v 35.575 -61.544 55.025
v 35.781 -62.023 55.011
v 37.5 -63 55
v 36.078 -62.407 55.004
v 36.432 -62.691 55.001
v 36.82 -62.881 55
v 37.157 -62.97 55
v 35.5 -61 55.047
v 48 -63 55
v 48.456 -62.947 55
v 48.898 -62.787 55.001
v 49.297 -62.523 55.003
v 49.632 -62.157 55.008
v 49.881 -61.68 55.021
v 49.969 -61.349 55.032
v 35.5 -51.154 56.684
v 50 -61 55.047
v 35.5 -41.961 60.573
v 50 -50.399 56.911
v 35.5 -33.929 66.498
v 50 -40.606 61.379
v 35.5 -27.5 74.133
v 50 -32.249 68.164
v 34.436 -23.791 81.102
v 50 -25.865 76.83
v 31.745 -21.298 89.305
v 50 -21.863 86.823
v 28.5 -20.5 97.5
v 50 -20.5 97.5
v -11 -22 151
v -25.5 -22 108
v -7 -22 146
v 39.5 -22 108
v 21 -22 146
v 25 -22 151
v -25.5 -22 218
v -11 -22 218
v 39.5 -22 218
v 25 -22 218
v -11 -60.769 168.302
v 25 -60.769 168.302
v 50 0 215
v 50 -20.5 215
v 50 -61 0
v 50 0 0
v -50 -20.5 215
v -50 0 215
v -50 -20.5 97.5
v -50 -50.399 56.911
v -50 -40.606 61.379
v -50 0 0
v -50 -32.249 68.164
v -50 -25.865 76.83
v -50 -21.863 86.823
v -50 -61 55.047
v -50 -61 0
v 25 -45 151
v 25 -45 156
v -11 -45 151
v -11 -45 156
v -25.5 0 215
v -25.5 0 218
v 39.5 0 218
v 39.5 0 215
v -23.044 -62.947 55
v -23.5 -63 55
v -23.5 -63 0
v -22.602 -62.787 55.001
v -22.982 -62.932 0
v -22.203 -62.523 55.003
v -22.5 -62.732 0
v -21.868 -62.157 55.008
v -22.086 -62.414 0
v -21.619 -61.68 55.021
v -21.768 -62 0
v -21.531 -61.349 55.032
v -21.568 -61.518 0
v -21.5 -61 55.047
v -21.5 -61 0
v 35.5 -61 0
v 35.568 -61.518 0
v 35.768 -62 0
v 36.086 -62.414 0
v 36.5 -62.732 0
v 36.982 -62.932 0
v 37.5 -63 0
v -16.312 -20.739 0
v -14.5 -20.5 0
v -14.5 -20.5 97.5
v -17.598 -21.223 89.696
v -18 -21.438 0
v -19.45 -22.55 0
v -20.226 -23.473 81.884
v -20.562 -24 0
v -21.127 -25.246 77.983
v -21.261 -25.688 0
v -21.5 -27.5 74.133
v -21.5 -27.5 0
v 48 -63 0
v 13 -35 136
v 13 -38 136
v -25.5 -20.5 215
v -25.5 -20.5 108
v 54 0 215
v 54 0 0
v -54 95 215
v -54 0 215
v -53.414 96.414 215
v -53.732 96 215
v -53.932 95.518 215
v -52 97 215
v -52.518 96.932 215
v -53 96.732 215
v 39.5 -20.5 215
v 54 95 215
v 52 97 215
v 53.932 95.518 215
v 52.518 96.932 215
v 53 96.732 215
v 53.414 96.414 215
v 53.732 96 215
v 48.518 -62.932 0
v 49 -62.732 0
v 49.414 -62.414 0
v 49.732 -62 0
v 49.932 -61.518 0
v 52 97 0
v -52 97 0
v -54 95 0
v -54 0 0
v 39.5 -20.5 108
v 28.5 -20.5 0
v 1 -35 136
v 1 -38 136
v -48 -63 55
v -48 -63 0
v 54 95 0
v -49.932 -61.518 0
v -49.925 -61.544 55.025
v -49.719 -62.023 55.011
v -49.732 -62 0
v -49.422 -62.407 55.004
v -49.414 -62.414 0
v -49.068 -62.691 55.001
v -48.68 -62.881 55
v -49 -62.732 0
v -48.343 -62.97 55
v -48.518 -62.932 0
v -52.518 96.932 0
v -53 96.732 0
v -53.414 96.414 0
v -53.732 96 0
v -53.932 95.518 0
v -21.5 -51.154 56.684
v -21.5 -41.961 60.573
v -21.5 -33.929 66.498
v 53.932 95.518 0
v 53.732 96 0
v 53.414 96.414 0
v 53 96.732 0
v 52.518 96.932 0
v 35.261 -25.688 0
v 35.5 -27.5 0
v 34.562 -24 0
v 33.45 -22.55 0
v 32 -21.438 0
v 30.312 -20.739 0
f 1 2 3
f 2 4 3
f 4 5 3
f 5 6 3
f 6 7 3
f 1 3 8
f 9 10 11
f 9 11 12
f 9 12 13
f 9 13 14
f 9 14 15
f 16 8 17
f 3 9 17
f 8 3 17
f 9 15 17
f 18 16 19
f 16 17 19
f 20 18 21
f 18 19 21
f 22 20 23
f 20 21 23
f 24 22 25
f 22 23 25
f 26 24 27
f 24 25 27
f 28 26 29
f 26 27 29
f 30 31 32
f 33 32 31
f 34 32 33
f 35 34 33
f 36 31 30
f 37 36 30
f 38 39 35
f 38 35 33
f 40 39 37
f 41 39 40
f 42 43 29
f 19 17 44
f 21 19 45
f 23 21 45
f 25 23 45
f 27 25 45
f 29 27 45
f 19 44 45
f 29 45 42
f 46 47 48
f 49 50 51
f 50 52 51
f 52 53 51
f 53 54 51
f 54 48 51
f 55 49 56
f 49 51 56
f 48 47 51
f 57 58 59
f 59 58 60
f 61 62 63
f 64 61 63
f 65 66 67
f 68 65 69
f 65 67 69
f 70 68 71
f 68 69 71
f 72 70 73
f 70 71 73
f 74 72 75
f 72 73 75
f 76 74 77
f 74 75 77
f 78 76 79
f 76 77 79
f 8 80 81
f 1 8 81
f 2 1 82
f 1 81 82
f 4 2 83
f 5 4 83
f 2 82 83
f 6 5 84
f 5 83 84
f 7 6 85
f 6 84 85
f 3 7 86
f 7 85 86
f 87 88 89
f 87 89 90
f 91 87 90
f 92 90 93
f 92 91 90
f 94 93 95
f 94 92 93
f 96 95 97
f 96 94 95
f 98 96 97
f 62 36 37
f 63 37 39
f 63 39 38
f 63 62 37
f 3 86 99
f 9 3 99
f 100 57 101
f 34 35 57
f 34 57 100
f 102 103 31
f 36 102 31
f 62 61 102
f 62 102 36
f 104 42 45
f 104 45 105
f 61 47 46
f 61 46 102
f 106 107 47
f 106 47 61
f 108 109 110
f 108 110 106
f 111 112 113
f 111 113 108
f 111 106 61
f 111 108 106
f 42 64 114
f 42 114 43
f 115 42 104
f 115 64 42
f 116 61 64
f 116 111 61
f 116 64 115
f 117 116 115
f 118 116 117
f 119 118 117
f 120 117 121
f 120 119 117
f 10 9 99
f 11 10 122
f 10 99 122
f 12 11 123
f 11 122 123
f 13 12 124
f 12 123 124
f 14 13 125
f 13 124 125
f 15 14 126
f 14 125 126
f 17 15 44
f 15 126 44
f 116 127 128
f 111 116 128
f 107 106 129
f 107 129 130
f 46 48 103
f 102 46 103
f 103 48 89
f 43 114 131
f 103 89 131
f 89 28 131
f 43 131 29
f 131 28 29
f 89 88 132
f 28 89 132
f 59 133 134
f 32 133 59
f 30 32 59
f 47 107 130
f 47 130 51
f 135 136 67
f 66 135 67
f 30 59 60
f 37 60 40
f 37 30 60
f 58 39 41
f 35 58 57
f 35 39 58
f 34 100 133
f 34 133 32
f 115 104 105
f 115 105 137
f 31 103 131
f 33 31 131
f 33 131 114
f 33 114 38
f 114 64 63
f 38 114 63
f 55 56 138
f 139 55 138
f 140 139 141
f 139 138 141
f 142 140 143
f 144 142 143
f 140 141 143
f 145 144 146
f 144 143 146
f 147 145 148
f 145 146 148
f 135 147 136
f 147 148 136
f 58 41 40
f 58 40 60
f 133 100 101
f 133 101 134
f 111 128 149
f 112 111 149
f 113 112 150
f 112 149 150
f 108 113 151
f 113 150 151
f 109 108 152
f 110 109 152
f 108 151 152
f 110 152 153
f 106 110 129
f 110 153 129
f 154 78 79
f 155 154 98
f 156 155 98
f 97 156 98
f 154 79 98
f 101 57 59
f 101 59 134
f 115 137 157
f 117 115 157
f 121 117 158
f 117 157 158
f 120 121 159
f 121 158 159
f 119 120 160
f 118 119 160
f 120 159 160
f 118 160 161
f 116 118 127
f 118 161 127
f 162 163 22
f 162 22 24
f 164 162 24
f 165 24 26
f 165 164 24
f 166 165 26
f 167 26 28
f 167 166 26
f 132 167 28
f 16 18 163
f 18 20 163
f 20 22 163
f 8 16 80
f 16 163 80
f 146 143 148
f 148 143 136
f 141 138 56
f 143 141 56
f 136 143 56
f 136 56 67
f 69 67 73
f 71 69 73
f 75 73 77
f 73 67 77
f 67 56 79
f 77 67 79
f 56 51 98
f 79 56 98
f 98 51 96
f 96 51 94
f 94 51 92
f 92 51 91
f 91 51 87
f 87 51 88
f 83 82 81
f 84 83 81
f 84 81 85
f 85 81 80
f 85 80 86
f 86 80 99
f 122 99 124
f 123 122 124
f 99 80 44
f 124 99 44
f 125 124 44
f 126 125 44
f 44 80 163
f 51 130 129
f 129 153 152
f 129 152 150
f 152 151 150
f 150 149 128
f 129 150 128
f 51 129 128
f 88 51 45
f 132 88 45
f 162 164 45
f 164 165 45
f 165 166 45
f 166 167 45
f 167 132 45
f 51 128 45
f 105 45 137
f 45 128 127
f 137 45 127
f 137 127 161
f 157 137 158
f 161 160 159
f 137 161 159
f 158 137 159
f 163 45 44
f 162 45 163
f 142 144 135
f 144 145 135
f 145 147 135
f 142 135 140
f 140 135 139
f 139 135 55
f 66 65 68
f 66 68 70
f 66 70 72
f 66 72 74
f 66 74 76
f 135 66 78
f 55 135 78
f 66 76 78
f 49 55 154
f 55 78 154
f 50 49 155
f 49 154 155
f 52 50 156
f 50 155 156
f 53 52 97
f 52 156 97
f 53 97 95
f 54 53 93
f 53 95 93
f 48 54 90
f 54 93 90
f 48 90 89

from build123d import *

# Parameters (mm, degrees)
PAD_DEPTH       = 215
POCKET_DEPTH    = 104.001
SKETCH003_W     = 65
SKETCH003_H     = 110
PAD002_DEPTH    = 22
PAD003_DEPTH    = 18
PAD004_DEPTH    = 23
POCKET001_DEPTH = 79.001


with BuildPart() as part:
    # Sketch → Pad (new body)
    with BuildSketch(Plane.XY):
        with BuildLine():
            Line((-54, 95), (-54, 0))
            Line((-54, 0), (-50, 0))
            Line((-50, 0), (-50, -61))
            ThreePointArc((-50, -61), (-49.4142135624, -62.4142135624), (-48, -63))
            Line((-48, -63), (-23.5, -63))
            ThreePointArc((-23.5, -63), (-22.0857864376, -62.4142135624), (-21.5, -61))
            Line((-21.5, -61), (-21.5, -27.5))
            ThreePointArc((-14.5, -20.5), (-19.4497474683, -22.5502525317), (-21.5, -27.5))
            Line((-14.5, -20.5), (28.5, -20.5))
            ThreePointArc((35.5, -27.5), (33.4497474683, -22.5502525317), (28.5, -20.5))
            Line((35.5, -27.5), (35.5, -61))
            ThreePointArc((35.5, -61), (36.0857864376, -62.4142135624), (37.5, -63))
            Line((37.5, -63), (48, -63))
            ThreePointArc((48, -63), (49.4142135624, -62.4142135624), (50, -61))
            Line((50, -61), (50, 0))
            Line((50, 0), (54, 0))
            Line((54, 0), (54, 95))
            ThreePointArc((54, 95), (53.4142135624, 96.4142135624), (52, 97))
            Line((52, 97), (-52, 97))
            ThreePointArc((-52, 97), (-53.4142135624, 96.4142135624), (-54, 95))
        make_face()
    extrude(amount=PAD_DEPTH)

    # Sketch001 (on DatumPlane) → Pocket (cut, through all)
    with BuildSketch(Plane.YZ.offset(50)):
        with BuildLine():
            Line((-20.5, 220), (-20.5, 97.5))
            ThreePointArc((-63, 55), (-32.9479617996, 67.4479617996), (-20.5, 97.5))
            Line((-63, 55), (-68, 55))
            Line((-68, 55), (-68, 220))
            Line((-68, 220), (-20.5, 220))
        make_face()
    extrude(amount=-POCKET_DEPTH, mode=Mode.SUBTRACT)

    # Sketch003 (on DatumPlane) → Pad002 (join)
    with BuildSketch(Plane.XZ):
        with Locations((7, 163)):
            Rectangle(SKETCH003_W, SKETCH003_H)
    extrude(amount=PAD002_DEPTH)

    # Sketch004 (on DatumPlane) → Pad003 (join, symmetric)
    with BuildSketch(Plane.YZ.offset(7)):
        Polygon((-22, 218), (-60.7693471681, 168.301532014), (-45, 156), (-22, 156), align=None)
    extrude(amount=PAD003_DEPTH, both=True)

    # Sketch005 (on DatumPlane) → Pad004 (join)
    with BuildSketch(Plane.XZ.offset(22)):
        Polygon((13, 136), (1, 136), (-11, 151), (-11, 156), (25, 156), (25, 151), align=None)
    extrude(amount=PAD004_DEPTH)

    # Sketch007 (on DatumPlane) → Pocket001 (cut, through all)
    with BuildSketch(Plane.YZ.offset(25)):
        Polygon((-45, 151), (-38, 136), (-35, 136), (-22, 146), (-22, 135), (-46, 135), (-46, 151), align=None)
    extrude(amount=-POCKET001_DEPTH, mode=Mode.SUBTRACT)


solid = part.part
